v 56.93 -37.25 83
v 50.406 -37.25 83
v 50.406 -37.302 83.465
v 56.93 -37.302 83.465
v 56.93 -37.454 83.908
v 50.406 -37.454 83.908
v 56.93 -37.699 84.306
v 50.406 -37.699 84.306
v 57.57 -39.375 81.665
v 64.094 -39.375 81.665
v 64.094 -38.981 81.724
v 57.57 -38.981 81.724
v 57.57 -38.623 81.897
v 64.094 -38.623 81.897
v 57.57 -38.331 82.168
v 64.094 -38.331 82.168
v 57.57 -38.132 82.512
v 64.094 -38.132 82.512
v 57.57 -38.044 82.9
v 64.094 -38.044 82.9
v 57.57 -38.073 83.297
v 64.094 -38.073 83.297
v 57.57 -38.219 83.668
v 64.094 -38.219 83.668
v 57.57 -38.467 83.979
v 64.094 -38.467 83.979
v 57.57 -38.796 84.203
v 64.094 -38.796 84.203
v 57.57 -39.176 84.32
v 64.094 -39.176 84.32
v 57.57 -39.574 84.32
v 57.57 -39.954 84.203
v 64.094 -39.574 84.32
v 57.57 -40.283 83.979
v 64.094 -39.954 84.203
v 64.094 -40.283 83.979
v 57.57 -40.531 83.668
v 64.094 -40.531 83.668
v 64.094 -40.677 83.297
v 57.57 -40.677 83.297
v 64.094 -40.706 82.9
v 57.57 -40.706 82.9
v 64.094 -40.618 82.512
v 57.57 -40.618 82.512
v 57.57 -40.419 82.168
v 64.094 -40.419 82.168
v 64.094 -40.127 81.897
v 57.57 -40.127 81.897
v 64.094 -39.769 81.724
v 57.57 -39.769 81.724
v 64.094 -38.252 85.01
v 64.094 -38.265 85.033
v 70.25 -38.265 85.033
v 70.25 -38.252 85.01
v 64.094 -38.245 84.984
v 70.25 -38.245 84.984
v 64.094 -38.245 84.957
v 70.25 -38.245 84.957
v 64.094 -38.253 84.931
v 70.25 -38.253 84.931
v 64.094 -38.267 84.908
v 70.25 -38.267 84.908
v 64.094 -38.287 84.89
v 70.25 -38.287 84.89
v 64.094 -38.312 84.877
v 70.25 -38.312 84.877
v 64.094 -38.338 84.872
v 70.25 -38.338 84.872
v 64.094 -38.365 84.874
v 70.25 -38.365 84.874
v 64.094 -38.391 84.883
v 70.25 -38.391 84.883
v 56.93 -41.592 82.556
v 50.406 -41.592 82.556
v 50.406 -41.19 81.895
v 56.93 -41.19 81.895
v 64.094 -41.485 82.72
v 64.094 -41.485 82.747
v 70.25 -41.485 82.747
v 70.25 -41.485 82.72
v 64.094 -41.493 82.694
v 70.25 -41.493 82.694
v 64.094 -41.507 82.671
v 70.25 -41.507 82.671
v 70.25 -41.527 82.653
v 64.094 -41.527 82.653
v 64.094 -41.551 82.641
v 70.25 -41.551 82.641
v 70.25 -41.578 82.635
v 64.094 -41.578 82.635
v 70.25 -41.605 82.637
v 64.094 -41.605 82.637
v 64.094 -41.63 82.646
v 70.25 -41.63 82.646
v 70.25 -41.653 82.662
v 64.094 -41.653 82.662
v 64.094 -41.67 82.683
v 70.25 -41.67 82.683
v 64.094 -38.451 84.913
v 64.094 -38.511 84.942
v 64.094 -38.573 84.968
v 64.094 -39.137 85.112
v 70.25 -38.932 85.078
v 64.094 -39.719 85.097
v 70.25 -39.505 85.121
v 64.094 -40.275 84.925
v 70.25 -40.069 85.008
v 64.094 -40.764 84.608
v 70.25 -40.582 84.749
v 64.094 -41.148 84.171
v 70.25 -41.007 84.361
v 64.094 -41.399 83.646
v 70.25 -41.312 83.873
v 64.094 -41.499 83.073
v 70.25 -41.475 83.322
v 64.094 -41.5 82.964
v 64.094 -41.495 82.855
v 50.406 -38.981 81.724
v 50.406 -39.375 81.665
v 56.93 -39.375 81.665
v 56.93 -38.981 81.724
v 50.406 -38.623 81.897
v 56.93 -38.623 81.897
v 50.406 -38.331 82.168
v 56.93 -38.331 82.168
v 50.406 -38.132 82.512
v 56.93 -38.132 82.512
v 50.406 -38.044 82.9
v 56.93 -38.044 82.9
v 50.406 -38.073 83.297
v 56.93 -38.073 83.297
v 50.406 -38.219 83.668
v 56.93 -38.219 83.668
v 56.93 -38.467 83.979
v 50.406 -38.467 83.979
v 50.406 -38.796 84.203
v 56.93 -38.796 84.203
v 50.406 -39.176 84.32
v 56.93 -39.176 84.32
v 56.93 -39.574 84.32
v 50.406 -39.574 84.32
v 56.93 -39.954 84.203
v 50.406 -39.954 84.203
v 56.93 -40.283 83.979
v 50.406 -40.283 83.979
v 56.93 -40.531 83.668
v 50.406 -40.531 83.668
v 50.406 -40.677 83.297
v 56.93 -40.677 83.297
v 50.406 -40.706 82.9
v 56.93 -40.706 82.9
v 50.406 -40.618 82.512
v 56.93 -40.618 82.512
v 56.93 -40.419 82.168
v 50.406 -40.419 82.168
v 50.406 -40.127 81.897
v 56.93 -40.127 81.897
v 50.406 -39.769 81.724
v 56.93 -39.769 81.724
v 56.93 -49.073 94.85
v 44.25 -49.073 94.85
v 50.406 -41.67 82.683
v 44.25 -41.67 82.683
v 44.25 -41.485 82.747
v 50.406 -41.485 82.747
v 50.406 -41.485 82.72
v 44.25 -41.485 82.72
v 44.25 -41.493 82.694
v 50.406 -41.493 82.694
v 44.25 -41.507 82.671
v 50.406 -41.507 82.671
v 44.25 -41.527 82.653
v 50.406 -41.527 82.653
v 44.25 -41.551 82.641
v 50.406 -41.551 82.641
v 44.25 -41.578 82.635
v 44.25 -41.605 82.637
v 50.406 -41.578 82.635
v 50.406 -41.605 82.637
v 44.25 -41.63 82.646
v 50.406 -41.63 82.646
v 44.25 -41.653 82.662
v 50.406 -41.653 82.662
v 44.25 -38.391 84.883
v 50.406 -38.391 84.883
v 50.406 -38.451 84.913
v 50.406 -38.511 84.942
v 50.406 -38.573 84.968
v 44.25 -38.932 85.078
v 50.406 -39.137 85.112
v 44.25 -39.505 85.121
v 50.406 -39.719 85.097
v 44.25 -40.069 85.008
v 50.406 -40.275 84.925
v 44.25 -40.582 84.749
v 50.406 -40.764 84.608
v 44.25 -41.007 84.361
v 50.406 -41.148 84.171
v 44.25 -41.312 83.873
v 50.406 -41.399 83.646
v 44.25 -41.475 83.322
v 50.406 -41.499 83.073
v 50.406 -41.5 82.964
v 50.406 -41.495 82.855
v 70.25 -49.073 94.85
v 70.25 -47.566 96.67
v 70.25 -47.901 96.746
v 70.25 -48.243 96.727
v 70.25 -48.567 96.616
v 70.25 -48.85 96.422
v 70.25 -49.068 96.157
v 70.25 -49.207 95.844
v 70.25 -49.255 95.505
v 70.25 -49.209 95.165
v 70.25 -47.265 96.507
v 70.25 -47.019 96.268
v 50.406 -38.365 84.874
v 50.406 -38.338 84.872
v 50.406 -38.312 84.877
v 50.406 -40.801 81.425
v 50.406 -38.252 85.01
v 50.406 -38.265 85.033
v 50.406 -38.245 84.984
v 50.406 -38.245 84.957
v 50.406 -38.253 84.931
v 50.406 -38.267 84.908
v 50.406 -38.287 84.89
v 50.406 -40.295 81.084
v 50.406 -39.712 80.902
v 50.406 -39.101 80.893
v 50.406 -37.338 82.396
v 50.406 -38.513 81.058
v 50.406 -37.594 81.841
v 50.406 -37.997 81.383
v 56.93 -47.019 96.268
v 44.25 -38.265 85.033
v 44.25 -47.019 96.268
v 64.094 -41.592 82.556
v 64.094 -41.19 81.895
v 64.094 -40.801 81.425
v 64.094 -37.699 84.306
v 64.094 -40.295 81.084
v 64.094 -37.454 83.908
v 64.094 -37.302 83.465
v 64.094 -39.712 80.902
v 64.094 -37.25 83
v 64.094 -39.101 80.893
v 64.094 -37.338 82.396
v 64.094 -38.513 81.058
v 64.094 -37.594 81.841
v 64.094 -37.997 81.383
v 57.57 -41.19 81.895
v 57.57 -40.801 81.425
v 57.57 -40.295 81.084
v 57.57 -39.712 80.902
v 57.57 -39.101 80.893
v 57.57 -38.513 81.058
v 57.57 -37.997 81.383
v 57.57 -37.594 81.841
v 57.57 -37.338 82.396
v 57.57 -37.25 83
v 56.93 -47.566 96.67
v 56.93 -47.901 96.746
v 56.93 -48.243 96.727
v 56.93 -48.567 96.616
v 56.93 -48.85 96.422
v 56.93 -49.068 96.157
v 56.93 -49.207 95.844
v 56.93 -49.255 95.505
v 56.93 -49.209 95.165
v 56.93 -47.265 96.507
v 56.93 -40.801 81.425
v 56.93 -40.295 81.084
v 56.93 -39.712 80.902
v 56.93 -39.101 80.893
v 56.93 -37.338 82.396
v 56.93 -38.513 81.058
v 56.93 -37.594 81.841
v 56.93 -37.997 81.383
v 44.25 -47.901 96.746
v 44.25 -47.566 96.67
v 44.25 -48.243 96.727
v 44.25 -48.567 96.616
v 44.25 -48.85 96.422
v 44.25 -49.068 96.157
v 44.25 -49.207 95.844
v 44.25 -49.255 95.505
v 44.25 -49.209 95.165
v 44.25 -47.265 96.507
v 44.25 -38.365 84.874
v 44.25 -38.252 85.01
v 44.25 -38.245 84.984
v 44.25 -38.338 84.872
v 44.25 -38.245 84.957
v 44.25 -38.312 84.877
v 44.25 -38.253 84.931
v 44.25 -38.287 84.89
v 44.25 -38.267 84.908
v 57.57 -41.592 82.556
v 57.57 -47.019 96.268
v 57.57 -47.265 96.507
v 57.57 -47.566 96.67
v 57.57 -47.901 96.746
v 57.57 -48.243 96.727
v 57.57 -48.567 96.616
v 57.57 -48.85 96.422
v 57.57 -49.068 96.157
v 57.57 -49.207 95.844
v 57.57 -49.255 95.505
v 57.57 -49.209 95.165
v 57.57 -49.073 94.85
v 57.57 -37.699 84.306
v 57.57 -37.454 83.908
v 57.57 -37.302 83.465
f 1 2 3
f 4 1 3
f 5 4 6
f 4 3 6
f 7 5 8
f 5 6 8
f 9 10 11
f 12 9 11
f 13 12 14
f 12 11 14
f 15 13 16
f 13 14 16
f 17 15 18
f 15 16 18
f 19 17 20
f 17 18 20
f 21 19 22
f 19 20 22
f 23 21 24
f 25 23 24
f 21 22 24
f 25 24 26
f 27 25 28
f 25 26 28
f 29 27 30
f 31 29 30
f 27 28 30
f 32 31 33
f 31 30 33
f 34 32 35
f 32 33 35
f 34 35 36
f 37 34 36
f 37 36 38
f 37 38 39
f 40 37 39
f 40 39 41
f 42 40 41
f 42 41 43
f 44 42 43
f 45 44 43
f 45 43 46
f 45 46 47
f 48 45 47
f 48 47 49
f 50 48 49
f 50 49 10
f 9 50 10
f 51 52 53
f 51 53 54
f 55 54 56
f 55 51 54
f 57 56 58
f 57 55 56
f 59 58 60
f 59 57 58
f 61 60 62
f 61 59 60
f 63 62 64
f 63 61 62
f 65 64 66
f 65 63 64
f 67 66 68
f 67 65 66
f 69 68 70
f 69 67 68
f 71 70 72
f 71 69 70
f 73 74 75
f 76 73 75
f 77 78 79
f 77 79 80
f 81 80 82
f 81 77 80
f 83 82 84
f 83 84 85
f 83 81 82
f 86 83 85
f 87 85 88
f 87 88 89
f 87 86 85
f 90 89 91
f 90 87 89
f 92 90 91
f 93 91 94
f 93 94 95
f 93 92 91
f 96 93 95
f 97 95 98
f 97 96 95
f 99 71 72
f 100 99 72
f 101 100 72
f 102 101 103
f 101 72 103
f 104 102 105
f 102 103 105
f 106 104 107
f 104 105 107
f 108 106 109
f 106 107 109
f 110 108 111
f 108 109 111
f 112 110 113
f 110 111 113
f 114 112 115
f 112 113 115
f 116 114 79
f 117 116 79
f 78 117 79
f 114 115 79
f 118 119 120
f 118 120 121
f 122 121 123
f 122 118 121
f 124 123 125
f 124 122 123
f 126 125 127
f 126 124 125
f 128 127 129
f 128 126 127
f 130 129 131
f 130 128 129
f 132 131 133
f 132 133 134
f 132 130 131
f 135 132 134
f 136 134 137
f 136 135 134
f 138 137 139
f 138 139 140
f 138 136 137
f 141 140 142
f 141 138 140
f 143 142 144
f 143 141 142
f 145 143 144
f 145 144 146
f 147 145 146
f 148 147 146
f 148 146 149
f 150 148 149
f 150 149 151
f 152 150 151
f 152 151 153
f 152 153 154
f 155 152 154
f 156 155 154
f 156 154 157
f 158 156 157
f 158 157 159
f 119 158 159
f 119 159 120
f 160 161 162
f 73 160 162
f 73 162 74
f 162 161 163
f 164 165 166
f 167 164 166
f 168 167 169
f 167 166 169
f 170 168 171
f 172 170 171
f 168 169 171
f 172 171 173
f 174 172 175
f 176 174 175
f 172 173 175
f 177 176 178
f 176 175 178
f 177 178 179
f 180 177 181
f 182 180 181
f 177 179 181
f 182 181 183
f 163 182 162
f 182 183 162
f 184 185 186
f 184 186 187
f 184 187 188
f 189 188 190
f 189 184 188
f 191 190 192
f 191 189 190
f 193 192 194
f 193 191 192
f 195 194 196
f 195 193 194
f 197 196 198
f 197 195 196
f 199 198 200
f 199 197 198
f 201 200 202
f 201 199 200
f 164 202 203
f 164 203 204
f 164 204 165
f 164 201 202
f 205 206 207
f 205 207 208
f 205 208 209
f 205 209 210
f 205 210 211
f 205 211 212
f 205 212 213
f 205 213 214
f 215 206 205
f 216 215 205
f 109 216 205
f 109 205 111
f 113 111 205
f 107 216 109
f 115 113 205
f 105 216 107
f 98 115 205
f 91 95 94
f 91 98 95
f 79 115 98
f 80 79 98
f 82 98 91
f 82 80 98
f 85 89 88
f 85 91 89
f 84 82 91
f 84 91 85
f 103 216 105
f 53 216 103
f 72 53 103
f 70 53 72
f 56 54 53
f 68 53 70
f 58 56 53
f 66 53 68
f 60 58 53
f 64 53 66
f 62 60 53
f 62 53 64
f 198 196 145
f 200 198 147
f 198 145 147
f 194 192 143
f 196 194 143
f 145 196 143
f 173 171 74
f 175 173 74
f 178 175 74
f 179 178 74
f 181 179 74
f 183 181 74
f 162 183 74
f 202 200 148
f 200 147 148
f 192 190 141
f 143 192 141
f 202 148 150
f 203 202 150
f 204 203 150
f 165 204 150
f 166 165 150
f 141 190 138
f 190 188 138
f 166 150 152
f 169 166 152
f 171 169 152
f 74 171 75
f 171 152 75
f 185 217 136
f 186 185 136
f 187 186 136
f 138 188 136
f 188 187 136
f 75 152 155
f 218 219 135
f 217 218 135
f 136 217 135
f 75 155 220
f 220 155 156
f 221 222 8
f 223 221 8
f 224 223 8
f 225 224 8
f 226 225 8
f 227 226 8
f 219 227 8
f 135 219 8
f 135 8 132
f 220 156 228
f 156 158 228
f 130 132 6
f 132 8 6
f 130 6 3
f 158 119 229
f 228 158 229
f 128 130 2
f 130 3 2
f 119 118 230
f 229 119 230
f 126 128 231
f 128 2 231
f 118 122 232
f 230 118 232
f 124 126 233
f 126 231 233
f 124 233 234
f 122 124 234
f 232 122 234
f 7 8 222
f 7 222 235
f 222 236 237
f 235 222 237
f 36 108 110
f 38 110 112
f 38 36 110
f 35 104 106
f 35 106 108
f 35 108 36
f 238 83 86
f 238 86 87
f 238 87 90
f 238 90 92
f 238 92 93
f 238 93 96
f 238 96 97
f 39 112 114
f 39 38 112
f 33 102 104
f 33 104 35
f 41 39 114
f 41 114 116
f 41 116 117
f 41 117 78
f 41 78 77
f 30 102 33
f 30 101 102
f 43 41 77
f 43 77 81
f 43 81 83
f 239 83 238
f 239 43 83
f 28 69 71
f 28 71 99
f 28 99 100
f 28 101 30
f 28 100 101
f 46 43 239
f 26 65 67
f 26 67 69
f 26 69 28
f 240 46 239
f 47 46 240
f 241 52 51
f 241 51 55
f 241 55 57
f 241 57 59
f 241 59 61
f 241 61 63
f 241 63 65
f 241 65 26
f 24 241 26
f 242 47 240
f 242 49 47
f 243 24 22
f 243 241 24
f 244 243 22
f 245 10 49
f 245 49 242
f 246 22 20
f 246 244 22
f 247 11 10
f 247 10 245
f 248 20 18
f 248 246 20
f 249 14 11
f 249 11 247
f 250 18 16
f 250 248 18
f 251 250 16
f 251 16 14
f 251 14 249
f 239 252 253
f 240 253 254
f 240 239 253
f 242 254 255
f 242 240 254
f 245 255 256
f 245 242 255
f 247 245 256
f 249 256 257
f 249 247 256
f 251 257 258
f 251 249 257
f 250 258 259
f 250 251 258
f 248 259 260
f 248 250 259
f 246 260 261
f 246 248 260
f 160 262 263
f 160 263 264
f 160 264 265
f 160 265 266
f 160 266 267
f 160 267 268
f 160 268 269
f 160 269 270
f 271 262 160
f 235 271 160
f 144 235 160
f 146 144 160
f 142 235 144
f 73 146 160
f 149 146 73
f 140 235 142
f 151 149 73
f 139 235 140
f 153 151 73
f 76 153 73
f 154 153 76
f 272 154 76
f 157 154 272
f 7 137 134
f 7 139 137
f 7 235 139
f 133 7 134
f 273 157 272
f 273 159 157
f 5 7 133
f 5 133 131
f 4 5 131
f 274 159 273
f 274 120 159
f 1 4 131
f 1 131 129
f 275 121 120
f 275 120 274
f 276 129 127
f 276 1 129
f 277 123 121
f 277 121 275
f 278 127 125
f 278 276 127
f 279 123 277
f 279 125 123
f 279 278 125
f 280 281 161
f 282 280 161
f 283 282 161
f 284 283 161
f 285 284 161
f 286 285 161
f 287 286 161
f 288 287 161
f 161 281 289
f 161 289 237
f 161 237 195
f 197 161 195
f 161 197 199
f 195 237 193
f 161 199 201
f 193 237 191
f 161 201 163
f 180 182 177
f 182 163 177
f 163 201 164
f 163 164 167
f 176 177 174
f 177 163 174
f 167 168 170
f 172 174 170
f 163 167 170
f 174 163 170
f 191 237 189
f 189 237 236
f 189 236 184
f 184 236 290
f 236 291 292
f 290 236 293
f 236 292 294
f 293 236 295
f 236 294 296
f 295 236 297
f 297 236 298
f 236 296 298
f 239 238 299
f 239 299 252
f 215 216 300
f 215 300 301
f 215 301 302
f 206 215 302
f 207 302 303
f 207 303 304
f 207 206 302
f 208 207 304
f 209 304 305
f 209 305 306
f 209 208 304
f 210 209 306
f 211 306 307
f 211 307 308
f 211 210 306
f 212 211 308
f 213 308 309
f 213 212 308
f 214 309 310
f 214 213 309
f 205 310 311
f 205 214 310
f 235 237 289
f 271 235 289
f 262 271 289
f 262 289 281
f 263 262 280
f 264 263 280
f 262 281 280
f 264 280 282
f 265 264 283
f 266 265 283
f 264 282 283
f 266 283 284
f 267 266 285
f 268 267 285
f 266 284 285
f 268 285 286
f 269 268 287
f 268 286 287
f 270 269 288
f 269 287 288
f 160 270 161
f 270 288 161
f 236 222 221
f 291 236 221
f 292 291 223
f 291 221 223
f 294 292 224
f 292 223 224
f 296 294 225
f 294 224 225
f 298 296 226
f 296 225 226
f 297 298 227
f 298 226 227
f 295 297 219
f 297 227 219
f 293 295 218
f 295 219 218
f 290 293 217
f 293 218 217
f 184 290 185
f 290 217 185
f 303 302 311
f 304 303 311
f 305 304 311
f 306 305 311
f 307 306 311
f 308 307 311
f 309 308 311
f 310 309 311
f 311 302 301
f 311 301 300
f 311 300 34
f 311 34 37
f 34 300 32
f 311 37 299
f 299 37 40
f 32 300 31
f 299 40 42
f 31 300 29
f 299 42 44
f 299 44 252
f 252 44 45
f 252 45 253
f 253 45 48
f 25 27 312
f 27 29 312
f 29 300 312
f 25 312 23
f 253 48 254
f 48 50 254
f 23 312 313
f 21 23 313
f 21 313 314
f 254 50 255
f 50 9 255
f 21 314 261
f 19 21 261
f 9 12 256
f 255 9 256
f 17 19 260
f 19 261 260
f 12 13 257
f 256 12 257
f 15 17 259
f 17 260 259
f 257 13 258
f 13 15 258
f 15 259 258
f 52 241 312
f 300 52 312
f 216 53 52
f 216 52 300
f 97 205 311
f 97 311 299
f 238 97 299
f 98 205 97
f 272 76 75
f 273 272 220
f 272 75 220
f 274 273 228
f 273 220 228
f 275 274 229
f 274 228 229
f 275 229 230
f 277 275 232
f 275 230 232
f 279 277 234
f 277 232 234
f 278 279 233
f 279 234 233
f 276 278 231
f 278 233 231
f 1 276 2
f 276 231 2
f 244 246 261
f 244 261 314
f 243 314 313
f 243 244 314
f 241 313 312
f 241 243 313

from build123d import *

# Parameters (mm, degrees)
SKETCH_1_R               = 1.335133797
SKETCH_1_R_2             = 1.25
EXTRUDE_1_DEPTH          = 12.680489019
SKETCH_2_R               = 2.125
SKETCH_2_R_2             = 1.335133797
CUT_EXTRUDE_1_DEPTH      = 6.156235
CUT_EXTRUDE_5_DEPTH      = 110.304219163
CUT_EXTRUDE_5_DEPTH_BACK = 6.156235


with BuildPart() as part:
    # 草图1 → 凸台-拉伸1 (new body)
    # profile 1 of 4: a face of its own
    with BuildSketch(Plane(origin=(70.25, 0, 0), x_dir=(0, 0, -1), z_dir=(1, 0, 0))):
        with BuildLine():
            ThreePointArc((-83.320828703, -41.475641317), (-82.582973687, -41.458678011), (-81.895424365, -41.19036158))
            ThreePointArc((-81.895424365, -41.19036158), (-81.147589648, -40.416249676), (-80.875, -39.375))
            ThreePointArc((-80.875, -39.375), (-81.49739809, -37.87239809), (-83, -37.25))
            ThreePointArc((-83, -37.25), (-83.690491555, -37.365311862), (-84.306044883, -37.698732789))
            ThreePointArc((-84.306044883, -37.698732789), (-85.056195254, -39.911363753), (-83.320828703, -41.475641317))
        make_face()
        with Locations((-83, -39.375)):
            Circle(SKETCH_1_R, mode=Mode.SUBTRACT)
    # profile 2 of 4: a face of its own
    with BuildSketch(Plane(origin=(70.25, 0, 0), x_dir=(0, 0, -1), z_dir=(1, 0, 0))):
        with BuildLine():
            ThreePointArc((-94.25, -48.005), (-94.410346852, -48.617499809), (-94.850249627, -49.072859753))
            Line((-94.850249627, -49.072859753), (-82.556206377, -41.592421268))
            Line((-82.556206377, -41.592421268), (-83.320828703, -41.475641317))
            ThreePointArc((-83.320828703, -41.475641317), (-85.056195254, -39.911363753), (-84.306044883, -37.698732789))
            Line((-84.306044883, -37.698732789), (-96.268261696, -47.018960464))
            ThreePointArc((-96.268261696, -47.018960464), (-94.951286559, -46.881873311), (-94.25, -48.005))
        make_face()
    # profile 3 of 4: a face of its own
    with BuildSketch(Plane(origin=(70.25, 0, 0), x_dir=(0, 0, -1), z_dir=(1, 0, 0))):
        with Locations((-95.5, -48.005)):
            Circle(SKETCH_1_R_2)
    # profile 4 of 4: a face of its own
    with BuildSketch(Plane(origin=(70.25, 0, 0), x_dir=(0, 0, -1), z_dir=(1, 0, 0))):
        with BuildLine():
            Line((-83.320828703, -41.475641317), (-82.556206377, -41.592421268))
            Line((-82.556206377, -41.592421268), (-81.895424365, -41.19036158))
            ThreePointArc((-81.895424365, -41.19036158), (-82.582973687, -41.458678011), (-83.320828703, -41.475641317))
        make_face()
    extrude(amount=-EXTRUDE_1_DEPTH)

    # 草图2 → 切除-拉伸1 (cut)
    with BuildSketch(Plane(origin=(70.25, 0, 0), x_dir=(0, 0, -1), z_dir=(1, 0, 0))):
        with Locations((-83, -39.375)):
            Circle(SKETCH_2_R)
        with Locations((-83, -39.375)):
            Circle(SKETCH_2_R_2, mode=Mode.SUBTRACT)
    extrude(amount=-CUT_EXTRUDE_1_DEPTH, mode=Mode.SUBTRACT)

    # 草图3 → 切除-拉伸5 (cut, two sides: drawn at the far end of the back side and taken through both)
    with BuildSketch(Plane(origin=(70.25, 0, 0), x_dir=(0, 0, -1), z_dir=(1, 0, 0)).offset(-CUT_EXTRUDE_5_DEPTH_BACK)):
        with BuildLine():
            Line((-84.067543243, -37.446744777), (-85.737782144, -37.446744777))
            Line((-85.737782144, -37.446744777), (-85.737782144, -38.573168545))
            Line((-85.737782144, -38.573168545), (-85.428355461, -38.573168545))
            Line((-85.428355461, -38.573168545), (-85.03331171, -38.265374617))
            Line((-85.03331171, -38.265374617), (-84.306044883, -37.698732789))
            ThreePointArc((-84.306044883, -37.698732789), (-84.631726105, -38.013715709), (-84.883228268, -38.390583273))
            ThreePointArc((-84.883228268, -38.390583273), (-84.927734779, -38.480872703), (-84.967915475, -38.573168545))
            Line((-84.967915475, -38.573168545), (-84.067543243, -38.573168545))
            Line((-84.067543243, -38.573168545), (-84.067543243, -37.446744777))
        make_face()
        with BuildLine():
            Line((-84.306044883, -37.698732789), (-85.03331171, -38.265374617))
            ThreePointArc((-85.03331171, -38.265374617), (-84.907790337, -38.267470669), (-84.883228268, -38.390583273))
            ThreePointArc((-84.883228268, -38.390583273), (-84.631726105, -38.013715709), (-84.306044883, -37.698732789))
        make_face()
        with BuildLine():
            Line((-83.072778558, -40.826749326), (-83.072778558, -41.498753348))
            ThreePointArc((-83.072778558, -41.498753348), (-82.909586711, -41.498075702), (-82.746928098, -41.484876682))
            ThreePointArc((-82.746928098, -41.484876682), (-82.305387522, -41.383267538), (-81.895424365, -41.19036158))
            Line((-81.895424365, -41.19036158), (-82.683038802, -41.669593777))
            Line((-82.683038802, -41.669593777), (-83.072778558, -41.906734984))
            Line((-83.072778558, -41.906734984), (-83.072778558, -42.126751075))
            Line((-83.072778558, -42.126751075), (-81.512776459, -42.126751075))
            Line((-81.512776459, -42.126751075), (-81.512776459, -40.826749326))
            Line((-81.512776459, -40.826749326), (-83.072778558, -40.826749326))
        make_face()
        with BuildLine():
            ThreePointArc((-81.895424365, -41.19036158), (-82.305387522, -41.383267538), (-82.746928098, -41.484876682))
            ThreePointArc((-82.746928098, -41.484876682), (-82.640512125, -41.55147735), (-82.683038802, -41.669593777))
            Line((-82.683038802, -41.669593777), (-81.895424365, -41.19036158))
        make_face()
    extrude(amount=CUT_EXTRUDE_5_DEPTH + CUT_EXTRUDE_5_DEPTH_BACK, mode=Mode.SUBTRACT)


with BuildPart() as body_2:
    # 镜向3: mirrored copy
    add(part.part.mirror(Plane(origin=(57.25, 0, 0), x_dir=(0, 0, 1), z_dir=(1, 0, 0))))


solid = Compound([part.part, body_2.part])
